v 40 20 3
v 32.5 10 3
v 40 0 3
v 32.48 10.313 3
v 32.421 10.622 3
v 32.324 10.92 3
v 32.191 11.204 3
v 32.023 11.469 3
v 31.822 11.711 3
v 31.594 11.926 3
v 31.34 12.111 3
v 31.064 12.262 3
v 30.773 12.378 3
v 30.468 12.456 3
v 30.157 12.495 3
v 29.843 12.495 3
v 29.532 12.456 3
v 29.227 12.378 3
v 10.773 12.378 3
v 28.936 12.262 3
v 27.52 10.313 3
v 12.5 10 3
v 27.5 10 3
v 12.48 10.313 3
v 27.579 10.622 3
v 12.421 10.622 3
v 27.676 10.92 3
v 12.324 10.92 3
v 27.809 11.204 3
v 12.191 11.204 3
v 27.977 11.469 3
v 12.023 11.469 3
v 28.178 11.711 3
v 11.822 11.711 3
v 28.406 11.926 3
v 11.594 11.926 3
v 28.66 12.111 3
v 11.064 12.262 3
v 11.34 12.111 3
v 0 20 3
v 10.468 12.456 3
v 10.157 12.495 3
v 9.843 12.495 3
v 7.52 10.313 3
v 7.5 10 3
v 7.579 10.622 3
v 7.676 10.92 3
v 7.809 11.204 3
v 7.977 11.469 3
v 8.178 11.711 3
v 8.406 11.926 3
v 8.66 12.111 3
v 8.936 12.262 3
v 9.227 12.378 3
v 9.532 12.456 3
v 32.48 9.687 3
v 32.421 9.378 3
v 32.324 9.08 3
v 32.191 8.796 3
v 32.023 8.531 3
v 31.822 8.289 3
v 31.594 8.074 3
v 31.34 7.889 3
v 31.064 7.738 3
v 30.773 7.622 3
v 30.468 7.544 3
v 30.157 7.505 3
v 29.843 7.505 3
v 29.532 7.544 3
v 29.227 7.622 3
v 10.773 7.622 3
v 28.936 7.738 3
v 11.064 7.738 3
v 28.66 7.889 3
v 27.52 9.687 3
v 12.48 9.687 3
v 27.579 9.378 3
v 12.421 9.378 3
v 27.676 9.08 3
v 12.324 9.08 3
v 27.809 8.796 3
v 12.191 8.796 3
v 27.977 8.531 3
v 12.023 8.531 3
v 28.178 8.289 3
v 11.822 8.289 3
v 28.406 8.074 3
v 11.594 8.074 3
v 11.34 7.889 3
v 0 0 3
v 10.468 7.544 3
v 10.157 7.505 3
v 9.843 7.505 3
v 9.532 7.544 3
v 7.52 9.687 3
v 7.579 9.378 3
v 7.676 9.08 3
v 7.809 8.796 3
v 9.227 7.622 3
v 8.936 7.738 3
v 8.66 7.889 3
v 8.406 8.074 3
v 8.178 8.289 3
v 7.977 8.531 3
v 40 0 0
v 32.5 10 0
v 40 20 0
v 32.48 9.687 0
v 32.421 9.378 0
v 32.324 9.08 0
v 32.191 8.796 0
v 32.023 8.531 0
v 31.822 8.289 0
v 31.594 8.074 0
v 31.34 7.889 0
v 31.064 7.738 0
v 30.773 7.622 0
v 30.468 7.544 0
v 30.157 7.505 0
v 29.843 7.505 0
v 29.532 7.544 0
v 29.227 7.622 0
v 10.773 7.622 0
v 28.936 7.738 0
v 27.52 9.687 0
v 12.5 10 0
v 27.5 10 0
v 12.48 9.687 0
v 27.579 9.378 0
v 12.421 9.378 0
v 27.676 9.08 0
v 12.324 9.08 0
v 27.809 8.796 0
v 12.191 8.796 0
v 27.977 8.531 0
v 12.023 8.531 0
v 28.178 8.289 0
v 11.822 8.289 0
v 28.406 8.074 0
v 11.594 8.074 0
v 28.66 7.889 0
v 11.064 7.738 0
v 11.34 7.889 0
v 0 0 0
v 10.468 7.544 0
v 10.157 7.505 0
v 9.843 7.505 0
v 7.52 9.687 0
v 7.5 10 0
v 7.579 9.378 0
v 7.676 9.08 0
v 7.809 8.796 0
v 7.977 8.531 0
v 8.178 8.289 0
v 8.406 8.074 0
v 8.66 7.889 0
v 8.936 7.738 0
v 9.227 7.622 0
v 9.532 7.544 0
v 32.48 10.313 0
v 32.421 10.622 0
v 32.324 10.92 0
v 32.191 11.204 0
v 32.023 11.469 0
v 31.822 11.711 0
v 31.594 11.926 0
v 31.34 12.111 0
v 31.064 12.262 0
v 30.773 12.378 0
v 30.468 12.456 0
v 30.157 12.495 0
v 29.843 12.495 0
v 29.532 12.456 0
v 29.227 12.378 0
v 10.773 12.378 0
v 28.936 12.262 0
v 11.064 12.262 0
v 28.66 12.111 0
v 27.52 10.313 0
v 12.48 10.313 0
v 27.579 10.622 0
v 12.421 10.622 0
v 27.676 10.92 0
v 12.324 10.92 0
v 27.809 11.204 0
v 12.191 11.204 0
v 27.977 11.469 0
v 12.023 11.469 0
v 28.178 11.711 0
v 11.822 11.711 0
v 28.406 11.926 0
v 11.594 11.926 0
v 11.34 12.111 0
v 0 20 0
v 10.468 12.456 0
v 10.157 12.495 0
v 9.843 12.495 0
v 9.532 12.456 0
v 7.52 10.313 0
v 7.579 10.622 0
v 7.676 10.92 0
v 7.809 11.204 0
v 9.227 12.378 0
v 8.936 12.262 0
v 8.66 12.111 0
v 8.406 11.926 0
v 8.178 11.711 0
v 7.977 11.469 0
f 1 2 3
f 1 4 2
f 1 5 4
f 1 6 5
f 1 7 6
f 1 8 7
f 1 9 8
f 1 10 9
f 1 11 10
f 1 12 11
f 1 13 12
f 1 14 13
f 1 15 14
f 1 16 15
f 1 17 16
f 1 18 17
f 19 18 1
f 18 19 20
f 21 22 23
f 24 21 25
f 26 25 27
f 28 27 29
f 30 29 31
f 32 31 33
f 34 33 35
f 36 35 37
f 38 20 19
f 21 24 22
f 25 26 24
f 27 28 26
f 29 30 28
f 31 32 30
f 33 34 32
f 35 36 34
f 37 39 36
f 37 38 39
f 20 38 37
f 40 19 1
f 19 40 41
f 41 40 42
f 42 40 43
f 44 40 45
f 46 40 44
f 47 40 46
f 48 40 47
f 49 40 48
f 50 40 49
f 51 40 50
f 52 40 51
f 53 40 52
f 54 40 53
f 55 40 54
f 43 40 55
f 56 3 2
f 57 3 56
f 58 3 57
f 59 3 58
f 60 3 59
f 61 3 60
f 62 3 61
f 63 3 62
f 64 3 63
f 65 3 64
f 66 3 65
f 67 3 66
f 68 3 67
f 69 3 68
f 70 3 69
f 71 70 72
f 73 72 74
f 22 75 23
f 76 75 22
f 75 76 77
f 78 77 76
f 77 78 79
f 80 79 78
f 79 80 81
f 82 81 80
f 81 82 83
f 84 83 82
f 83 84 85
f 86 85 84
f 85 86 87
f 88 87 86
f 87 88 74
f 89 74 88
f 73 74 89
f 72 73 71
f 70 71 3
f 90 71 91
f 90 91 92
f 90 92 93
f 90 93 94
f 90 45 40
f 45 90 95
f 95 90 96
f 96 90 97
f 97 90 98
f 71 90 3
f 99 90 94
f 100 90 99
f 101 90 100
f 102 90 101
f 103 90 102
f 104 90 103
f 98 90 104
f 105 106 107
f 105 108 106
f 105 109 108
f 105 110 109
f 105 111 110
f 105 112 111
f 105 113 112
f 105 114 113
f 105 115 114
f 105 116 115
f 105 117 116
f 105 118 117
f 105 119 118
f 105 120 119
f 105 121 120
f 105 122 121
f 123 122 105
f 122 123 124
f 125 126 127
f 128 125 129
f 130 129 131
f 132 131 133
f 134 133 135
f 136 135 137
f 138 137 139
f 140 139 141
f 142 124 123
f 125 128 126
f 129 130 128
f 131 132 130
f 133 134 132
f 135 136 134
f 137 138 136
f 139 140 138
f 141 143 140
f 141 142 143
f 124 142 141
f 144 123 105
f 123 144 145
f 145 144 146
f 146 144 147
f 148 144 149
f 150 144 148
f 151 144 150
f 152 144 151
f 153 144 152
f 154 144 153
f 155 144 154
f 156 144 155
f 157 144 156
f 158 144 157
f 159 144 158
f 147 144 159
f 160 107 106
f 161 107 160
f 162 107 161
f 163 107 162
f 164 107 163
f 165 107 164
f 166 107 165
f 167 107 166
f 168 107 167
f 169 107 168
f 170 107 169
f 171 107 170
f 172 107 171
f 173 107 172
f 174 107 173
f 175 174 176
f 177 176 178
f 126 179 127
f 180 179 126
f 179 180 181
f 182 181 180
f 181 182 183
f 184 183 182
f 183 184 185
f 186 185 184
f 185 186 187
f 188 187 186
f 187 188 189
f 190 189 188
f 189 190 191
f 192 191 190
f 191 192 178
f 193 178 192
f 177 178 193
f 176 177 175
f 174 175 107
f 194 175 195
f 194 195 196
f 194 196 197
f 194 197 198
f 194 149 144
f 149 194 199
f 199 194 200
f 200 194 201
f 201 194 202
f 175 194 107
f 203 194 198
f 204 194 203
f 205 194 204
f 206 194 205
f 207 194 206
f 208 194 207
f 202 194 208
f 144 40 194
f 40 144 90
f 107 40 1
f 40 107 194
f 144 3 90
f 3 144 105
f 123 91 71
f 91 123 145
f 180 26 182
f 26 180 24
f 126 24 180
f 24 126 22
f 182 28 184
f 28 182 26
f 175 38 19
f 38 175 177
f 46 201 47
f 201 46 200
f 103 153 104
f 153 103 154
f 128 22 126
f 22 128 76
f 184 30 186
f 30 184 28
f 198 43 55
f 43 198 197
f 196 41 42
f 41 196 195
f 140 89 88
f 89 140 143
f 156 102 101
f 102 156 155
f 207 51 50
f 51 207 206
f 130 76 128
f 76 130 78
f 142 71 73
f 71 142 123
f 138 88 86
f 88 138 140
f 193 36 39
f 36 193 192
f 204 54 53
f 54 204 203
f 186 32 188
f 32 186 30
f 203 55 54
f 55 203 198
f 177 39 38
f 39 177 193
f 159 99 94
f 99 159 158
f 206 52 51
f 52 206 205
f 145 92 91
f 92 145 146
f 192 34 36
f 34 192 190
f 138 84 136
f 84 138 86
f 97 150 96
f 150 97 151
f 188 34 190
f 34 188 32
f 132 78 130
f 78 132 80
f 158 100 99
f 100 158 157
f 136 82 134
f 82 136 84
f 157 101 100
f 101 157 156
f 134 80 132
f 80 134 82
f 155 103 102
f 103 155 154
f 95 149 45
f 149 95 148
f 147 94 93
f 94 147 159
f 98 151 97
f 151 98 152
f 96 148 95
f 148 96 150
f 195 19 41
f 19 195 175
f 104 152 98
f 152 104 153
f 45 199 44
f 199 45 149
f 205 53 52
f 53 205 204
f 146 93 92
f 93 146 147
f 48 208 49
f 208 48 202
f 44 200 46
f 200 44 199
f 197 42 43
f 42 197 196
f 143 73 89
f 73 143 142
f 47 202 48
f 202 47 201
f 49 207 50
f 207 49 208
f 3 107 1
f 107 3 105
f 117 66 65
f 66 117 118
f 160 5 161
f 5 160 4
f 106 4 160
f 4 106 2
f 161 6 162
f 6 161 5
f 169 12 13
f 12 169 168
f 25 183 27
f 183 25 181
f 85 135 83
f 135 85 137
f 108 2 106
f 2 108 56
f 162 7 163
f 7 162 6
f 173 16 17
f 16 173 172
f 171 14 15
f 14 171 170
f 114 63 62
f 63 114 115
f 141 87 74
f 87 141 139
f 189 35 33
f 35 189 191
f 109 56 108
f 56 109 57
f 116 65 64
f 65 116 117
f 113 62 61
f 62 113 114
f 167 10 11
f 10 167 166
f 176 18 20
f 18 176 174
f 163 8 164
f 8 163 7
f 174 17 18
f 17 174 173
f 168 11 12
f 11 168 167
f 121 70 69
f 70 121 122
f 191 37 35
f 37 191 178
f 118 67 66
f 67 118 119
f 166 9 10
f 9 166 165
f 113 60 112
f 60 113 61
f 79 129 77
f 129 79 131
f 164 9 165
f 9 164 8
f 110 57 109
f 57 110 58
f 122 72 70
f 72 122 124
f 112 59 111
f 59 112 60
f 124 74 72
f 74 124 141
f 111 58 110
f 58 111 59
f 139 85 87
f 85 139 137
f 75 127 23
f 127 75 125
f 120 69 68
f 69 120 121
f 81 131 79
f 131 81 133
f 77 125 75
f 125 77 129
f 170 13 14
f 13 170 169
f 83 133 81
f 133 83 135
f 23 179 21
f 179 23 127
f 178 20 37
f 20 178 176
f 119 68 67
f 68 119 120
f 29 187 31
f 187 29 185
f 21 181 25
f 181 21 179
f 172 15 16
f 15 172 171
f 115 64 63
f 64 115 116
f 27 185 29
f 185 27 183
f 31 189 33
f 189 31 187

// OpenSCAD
$fn = 50;

/**
 * A component to hold a 3mm LED.
 *
 * @param width        width of the component surface (x-axis)
 * @param length       length of the component surface (y-axis)
 * @param height       height of the component surface (z-axis)
 */
module led(width, length, height) {
  translate([width / 2, length / 2, height / 2]) {
    difference() {
      hole_radius = 2.5;
      
      // surface
      cube([width, length, height], true);
      
      // hole
      cylinder(h = 7, r = hole_radius, center = true);
    }
  }
}

// Test the component
rows = 1;
columns = 2;

component_length = 20;
component_width = 20;
panel_thickness = 3;

for (i = [0:columns - 1]) {
  for (j = [0:rows - 1]) {
    translate([component_width * i, component_length * j, 0])
      led(component_width, component_length, panel_thickness);
  }
}
